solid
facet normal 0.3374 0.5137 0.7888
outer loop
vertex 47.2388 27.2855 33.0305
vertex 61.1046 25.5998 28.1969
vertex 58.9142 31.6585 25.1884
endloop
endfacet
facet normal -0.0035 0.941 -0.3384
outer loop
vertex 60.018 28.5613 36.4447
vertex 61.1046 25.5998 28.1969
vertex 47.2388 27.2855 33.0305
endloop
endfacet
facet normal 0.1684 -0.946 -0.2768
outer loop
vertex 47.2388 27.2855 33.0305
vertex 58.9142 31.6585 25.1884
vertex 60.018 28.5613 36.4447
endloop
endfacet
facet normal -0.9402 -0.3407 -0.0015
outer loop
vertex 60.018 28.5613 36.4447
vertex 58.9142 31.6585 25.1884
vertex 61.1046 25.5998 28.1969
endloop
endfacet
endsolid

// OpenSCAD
// Auto-generated auxetic polyhedron
points = [
    [58.914184, 31.658463, 25.188421],
    [61.104578, 25.599755, 28.196948],
    [47.238831, 27.285517, 33.030490],
    [60.018013, 28.561342, 36.444673],
];

faces = [
    [0, 1, 2],
    [2, 1, 3],
    [3, 0, 2],
    [1, 0, 3],
];

polyhedron(points = points, faces = faces);
